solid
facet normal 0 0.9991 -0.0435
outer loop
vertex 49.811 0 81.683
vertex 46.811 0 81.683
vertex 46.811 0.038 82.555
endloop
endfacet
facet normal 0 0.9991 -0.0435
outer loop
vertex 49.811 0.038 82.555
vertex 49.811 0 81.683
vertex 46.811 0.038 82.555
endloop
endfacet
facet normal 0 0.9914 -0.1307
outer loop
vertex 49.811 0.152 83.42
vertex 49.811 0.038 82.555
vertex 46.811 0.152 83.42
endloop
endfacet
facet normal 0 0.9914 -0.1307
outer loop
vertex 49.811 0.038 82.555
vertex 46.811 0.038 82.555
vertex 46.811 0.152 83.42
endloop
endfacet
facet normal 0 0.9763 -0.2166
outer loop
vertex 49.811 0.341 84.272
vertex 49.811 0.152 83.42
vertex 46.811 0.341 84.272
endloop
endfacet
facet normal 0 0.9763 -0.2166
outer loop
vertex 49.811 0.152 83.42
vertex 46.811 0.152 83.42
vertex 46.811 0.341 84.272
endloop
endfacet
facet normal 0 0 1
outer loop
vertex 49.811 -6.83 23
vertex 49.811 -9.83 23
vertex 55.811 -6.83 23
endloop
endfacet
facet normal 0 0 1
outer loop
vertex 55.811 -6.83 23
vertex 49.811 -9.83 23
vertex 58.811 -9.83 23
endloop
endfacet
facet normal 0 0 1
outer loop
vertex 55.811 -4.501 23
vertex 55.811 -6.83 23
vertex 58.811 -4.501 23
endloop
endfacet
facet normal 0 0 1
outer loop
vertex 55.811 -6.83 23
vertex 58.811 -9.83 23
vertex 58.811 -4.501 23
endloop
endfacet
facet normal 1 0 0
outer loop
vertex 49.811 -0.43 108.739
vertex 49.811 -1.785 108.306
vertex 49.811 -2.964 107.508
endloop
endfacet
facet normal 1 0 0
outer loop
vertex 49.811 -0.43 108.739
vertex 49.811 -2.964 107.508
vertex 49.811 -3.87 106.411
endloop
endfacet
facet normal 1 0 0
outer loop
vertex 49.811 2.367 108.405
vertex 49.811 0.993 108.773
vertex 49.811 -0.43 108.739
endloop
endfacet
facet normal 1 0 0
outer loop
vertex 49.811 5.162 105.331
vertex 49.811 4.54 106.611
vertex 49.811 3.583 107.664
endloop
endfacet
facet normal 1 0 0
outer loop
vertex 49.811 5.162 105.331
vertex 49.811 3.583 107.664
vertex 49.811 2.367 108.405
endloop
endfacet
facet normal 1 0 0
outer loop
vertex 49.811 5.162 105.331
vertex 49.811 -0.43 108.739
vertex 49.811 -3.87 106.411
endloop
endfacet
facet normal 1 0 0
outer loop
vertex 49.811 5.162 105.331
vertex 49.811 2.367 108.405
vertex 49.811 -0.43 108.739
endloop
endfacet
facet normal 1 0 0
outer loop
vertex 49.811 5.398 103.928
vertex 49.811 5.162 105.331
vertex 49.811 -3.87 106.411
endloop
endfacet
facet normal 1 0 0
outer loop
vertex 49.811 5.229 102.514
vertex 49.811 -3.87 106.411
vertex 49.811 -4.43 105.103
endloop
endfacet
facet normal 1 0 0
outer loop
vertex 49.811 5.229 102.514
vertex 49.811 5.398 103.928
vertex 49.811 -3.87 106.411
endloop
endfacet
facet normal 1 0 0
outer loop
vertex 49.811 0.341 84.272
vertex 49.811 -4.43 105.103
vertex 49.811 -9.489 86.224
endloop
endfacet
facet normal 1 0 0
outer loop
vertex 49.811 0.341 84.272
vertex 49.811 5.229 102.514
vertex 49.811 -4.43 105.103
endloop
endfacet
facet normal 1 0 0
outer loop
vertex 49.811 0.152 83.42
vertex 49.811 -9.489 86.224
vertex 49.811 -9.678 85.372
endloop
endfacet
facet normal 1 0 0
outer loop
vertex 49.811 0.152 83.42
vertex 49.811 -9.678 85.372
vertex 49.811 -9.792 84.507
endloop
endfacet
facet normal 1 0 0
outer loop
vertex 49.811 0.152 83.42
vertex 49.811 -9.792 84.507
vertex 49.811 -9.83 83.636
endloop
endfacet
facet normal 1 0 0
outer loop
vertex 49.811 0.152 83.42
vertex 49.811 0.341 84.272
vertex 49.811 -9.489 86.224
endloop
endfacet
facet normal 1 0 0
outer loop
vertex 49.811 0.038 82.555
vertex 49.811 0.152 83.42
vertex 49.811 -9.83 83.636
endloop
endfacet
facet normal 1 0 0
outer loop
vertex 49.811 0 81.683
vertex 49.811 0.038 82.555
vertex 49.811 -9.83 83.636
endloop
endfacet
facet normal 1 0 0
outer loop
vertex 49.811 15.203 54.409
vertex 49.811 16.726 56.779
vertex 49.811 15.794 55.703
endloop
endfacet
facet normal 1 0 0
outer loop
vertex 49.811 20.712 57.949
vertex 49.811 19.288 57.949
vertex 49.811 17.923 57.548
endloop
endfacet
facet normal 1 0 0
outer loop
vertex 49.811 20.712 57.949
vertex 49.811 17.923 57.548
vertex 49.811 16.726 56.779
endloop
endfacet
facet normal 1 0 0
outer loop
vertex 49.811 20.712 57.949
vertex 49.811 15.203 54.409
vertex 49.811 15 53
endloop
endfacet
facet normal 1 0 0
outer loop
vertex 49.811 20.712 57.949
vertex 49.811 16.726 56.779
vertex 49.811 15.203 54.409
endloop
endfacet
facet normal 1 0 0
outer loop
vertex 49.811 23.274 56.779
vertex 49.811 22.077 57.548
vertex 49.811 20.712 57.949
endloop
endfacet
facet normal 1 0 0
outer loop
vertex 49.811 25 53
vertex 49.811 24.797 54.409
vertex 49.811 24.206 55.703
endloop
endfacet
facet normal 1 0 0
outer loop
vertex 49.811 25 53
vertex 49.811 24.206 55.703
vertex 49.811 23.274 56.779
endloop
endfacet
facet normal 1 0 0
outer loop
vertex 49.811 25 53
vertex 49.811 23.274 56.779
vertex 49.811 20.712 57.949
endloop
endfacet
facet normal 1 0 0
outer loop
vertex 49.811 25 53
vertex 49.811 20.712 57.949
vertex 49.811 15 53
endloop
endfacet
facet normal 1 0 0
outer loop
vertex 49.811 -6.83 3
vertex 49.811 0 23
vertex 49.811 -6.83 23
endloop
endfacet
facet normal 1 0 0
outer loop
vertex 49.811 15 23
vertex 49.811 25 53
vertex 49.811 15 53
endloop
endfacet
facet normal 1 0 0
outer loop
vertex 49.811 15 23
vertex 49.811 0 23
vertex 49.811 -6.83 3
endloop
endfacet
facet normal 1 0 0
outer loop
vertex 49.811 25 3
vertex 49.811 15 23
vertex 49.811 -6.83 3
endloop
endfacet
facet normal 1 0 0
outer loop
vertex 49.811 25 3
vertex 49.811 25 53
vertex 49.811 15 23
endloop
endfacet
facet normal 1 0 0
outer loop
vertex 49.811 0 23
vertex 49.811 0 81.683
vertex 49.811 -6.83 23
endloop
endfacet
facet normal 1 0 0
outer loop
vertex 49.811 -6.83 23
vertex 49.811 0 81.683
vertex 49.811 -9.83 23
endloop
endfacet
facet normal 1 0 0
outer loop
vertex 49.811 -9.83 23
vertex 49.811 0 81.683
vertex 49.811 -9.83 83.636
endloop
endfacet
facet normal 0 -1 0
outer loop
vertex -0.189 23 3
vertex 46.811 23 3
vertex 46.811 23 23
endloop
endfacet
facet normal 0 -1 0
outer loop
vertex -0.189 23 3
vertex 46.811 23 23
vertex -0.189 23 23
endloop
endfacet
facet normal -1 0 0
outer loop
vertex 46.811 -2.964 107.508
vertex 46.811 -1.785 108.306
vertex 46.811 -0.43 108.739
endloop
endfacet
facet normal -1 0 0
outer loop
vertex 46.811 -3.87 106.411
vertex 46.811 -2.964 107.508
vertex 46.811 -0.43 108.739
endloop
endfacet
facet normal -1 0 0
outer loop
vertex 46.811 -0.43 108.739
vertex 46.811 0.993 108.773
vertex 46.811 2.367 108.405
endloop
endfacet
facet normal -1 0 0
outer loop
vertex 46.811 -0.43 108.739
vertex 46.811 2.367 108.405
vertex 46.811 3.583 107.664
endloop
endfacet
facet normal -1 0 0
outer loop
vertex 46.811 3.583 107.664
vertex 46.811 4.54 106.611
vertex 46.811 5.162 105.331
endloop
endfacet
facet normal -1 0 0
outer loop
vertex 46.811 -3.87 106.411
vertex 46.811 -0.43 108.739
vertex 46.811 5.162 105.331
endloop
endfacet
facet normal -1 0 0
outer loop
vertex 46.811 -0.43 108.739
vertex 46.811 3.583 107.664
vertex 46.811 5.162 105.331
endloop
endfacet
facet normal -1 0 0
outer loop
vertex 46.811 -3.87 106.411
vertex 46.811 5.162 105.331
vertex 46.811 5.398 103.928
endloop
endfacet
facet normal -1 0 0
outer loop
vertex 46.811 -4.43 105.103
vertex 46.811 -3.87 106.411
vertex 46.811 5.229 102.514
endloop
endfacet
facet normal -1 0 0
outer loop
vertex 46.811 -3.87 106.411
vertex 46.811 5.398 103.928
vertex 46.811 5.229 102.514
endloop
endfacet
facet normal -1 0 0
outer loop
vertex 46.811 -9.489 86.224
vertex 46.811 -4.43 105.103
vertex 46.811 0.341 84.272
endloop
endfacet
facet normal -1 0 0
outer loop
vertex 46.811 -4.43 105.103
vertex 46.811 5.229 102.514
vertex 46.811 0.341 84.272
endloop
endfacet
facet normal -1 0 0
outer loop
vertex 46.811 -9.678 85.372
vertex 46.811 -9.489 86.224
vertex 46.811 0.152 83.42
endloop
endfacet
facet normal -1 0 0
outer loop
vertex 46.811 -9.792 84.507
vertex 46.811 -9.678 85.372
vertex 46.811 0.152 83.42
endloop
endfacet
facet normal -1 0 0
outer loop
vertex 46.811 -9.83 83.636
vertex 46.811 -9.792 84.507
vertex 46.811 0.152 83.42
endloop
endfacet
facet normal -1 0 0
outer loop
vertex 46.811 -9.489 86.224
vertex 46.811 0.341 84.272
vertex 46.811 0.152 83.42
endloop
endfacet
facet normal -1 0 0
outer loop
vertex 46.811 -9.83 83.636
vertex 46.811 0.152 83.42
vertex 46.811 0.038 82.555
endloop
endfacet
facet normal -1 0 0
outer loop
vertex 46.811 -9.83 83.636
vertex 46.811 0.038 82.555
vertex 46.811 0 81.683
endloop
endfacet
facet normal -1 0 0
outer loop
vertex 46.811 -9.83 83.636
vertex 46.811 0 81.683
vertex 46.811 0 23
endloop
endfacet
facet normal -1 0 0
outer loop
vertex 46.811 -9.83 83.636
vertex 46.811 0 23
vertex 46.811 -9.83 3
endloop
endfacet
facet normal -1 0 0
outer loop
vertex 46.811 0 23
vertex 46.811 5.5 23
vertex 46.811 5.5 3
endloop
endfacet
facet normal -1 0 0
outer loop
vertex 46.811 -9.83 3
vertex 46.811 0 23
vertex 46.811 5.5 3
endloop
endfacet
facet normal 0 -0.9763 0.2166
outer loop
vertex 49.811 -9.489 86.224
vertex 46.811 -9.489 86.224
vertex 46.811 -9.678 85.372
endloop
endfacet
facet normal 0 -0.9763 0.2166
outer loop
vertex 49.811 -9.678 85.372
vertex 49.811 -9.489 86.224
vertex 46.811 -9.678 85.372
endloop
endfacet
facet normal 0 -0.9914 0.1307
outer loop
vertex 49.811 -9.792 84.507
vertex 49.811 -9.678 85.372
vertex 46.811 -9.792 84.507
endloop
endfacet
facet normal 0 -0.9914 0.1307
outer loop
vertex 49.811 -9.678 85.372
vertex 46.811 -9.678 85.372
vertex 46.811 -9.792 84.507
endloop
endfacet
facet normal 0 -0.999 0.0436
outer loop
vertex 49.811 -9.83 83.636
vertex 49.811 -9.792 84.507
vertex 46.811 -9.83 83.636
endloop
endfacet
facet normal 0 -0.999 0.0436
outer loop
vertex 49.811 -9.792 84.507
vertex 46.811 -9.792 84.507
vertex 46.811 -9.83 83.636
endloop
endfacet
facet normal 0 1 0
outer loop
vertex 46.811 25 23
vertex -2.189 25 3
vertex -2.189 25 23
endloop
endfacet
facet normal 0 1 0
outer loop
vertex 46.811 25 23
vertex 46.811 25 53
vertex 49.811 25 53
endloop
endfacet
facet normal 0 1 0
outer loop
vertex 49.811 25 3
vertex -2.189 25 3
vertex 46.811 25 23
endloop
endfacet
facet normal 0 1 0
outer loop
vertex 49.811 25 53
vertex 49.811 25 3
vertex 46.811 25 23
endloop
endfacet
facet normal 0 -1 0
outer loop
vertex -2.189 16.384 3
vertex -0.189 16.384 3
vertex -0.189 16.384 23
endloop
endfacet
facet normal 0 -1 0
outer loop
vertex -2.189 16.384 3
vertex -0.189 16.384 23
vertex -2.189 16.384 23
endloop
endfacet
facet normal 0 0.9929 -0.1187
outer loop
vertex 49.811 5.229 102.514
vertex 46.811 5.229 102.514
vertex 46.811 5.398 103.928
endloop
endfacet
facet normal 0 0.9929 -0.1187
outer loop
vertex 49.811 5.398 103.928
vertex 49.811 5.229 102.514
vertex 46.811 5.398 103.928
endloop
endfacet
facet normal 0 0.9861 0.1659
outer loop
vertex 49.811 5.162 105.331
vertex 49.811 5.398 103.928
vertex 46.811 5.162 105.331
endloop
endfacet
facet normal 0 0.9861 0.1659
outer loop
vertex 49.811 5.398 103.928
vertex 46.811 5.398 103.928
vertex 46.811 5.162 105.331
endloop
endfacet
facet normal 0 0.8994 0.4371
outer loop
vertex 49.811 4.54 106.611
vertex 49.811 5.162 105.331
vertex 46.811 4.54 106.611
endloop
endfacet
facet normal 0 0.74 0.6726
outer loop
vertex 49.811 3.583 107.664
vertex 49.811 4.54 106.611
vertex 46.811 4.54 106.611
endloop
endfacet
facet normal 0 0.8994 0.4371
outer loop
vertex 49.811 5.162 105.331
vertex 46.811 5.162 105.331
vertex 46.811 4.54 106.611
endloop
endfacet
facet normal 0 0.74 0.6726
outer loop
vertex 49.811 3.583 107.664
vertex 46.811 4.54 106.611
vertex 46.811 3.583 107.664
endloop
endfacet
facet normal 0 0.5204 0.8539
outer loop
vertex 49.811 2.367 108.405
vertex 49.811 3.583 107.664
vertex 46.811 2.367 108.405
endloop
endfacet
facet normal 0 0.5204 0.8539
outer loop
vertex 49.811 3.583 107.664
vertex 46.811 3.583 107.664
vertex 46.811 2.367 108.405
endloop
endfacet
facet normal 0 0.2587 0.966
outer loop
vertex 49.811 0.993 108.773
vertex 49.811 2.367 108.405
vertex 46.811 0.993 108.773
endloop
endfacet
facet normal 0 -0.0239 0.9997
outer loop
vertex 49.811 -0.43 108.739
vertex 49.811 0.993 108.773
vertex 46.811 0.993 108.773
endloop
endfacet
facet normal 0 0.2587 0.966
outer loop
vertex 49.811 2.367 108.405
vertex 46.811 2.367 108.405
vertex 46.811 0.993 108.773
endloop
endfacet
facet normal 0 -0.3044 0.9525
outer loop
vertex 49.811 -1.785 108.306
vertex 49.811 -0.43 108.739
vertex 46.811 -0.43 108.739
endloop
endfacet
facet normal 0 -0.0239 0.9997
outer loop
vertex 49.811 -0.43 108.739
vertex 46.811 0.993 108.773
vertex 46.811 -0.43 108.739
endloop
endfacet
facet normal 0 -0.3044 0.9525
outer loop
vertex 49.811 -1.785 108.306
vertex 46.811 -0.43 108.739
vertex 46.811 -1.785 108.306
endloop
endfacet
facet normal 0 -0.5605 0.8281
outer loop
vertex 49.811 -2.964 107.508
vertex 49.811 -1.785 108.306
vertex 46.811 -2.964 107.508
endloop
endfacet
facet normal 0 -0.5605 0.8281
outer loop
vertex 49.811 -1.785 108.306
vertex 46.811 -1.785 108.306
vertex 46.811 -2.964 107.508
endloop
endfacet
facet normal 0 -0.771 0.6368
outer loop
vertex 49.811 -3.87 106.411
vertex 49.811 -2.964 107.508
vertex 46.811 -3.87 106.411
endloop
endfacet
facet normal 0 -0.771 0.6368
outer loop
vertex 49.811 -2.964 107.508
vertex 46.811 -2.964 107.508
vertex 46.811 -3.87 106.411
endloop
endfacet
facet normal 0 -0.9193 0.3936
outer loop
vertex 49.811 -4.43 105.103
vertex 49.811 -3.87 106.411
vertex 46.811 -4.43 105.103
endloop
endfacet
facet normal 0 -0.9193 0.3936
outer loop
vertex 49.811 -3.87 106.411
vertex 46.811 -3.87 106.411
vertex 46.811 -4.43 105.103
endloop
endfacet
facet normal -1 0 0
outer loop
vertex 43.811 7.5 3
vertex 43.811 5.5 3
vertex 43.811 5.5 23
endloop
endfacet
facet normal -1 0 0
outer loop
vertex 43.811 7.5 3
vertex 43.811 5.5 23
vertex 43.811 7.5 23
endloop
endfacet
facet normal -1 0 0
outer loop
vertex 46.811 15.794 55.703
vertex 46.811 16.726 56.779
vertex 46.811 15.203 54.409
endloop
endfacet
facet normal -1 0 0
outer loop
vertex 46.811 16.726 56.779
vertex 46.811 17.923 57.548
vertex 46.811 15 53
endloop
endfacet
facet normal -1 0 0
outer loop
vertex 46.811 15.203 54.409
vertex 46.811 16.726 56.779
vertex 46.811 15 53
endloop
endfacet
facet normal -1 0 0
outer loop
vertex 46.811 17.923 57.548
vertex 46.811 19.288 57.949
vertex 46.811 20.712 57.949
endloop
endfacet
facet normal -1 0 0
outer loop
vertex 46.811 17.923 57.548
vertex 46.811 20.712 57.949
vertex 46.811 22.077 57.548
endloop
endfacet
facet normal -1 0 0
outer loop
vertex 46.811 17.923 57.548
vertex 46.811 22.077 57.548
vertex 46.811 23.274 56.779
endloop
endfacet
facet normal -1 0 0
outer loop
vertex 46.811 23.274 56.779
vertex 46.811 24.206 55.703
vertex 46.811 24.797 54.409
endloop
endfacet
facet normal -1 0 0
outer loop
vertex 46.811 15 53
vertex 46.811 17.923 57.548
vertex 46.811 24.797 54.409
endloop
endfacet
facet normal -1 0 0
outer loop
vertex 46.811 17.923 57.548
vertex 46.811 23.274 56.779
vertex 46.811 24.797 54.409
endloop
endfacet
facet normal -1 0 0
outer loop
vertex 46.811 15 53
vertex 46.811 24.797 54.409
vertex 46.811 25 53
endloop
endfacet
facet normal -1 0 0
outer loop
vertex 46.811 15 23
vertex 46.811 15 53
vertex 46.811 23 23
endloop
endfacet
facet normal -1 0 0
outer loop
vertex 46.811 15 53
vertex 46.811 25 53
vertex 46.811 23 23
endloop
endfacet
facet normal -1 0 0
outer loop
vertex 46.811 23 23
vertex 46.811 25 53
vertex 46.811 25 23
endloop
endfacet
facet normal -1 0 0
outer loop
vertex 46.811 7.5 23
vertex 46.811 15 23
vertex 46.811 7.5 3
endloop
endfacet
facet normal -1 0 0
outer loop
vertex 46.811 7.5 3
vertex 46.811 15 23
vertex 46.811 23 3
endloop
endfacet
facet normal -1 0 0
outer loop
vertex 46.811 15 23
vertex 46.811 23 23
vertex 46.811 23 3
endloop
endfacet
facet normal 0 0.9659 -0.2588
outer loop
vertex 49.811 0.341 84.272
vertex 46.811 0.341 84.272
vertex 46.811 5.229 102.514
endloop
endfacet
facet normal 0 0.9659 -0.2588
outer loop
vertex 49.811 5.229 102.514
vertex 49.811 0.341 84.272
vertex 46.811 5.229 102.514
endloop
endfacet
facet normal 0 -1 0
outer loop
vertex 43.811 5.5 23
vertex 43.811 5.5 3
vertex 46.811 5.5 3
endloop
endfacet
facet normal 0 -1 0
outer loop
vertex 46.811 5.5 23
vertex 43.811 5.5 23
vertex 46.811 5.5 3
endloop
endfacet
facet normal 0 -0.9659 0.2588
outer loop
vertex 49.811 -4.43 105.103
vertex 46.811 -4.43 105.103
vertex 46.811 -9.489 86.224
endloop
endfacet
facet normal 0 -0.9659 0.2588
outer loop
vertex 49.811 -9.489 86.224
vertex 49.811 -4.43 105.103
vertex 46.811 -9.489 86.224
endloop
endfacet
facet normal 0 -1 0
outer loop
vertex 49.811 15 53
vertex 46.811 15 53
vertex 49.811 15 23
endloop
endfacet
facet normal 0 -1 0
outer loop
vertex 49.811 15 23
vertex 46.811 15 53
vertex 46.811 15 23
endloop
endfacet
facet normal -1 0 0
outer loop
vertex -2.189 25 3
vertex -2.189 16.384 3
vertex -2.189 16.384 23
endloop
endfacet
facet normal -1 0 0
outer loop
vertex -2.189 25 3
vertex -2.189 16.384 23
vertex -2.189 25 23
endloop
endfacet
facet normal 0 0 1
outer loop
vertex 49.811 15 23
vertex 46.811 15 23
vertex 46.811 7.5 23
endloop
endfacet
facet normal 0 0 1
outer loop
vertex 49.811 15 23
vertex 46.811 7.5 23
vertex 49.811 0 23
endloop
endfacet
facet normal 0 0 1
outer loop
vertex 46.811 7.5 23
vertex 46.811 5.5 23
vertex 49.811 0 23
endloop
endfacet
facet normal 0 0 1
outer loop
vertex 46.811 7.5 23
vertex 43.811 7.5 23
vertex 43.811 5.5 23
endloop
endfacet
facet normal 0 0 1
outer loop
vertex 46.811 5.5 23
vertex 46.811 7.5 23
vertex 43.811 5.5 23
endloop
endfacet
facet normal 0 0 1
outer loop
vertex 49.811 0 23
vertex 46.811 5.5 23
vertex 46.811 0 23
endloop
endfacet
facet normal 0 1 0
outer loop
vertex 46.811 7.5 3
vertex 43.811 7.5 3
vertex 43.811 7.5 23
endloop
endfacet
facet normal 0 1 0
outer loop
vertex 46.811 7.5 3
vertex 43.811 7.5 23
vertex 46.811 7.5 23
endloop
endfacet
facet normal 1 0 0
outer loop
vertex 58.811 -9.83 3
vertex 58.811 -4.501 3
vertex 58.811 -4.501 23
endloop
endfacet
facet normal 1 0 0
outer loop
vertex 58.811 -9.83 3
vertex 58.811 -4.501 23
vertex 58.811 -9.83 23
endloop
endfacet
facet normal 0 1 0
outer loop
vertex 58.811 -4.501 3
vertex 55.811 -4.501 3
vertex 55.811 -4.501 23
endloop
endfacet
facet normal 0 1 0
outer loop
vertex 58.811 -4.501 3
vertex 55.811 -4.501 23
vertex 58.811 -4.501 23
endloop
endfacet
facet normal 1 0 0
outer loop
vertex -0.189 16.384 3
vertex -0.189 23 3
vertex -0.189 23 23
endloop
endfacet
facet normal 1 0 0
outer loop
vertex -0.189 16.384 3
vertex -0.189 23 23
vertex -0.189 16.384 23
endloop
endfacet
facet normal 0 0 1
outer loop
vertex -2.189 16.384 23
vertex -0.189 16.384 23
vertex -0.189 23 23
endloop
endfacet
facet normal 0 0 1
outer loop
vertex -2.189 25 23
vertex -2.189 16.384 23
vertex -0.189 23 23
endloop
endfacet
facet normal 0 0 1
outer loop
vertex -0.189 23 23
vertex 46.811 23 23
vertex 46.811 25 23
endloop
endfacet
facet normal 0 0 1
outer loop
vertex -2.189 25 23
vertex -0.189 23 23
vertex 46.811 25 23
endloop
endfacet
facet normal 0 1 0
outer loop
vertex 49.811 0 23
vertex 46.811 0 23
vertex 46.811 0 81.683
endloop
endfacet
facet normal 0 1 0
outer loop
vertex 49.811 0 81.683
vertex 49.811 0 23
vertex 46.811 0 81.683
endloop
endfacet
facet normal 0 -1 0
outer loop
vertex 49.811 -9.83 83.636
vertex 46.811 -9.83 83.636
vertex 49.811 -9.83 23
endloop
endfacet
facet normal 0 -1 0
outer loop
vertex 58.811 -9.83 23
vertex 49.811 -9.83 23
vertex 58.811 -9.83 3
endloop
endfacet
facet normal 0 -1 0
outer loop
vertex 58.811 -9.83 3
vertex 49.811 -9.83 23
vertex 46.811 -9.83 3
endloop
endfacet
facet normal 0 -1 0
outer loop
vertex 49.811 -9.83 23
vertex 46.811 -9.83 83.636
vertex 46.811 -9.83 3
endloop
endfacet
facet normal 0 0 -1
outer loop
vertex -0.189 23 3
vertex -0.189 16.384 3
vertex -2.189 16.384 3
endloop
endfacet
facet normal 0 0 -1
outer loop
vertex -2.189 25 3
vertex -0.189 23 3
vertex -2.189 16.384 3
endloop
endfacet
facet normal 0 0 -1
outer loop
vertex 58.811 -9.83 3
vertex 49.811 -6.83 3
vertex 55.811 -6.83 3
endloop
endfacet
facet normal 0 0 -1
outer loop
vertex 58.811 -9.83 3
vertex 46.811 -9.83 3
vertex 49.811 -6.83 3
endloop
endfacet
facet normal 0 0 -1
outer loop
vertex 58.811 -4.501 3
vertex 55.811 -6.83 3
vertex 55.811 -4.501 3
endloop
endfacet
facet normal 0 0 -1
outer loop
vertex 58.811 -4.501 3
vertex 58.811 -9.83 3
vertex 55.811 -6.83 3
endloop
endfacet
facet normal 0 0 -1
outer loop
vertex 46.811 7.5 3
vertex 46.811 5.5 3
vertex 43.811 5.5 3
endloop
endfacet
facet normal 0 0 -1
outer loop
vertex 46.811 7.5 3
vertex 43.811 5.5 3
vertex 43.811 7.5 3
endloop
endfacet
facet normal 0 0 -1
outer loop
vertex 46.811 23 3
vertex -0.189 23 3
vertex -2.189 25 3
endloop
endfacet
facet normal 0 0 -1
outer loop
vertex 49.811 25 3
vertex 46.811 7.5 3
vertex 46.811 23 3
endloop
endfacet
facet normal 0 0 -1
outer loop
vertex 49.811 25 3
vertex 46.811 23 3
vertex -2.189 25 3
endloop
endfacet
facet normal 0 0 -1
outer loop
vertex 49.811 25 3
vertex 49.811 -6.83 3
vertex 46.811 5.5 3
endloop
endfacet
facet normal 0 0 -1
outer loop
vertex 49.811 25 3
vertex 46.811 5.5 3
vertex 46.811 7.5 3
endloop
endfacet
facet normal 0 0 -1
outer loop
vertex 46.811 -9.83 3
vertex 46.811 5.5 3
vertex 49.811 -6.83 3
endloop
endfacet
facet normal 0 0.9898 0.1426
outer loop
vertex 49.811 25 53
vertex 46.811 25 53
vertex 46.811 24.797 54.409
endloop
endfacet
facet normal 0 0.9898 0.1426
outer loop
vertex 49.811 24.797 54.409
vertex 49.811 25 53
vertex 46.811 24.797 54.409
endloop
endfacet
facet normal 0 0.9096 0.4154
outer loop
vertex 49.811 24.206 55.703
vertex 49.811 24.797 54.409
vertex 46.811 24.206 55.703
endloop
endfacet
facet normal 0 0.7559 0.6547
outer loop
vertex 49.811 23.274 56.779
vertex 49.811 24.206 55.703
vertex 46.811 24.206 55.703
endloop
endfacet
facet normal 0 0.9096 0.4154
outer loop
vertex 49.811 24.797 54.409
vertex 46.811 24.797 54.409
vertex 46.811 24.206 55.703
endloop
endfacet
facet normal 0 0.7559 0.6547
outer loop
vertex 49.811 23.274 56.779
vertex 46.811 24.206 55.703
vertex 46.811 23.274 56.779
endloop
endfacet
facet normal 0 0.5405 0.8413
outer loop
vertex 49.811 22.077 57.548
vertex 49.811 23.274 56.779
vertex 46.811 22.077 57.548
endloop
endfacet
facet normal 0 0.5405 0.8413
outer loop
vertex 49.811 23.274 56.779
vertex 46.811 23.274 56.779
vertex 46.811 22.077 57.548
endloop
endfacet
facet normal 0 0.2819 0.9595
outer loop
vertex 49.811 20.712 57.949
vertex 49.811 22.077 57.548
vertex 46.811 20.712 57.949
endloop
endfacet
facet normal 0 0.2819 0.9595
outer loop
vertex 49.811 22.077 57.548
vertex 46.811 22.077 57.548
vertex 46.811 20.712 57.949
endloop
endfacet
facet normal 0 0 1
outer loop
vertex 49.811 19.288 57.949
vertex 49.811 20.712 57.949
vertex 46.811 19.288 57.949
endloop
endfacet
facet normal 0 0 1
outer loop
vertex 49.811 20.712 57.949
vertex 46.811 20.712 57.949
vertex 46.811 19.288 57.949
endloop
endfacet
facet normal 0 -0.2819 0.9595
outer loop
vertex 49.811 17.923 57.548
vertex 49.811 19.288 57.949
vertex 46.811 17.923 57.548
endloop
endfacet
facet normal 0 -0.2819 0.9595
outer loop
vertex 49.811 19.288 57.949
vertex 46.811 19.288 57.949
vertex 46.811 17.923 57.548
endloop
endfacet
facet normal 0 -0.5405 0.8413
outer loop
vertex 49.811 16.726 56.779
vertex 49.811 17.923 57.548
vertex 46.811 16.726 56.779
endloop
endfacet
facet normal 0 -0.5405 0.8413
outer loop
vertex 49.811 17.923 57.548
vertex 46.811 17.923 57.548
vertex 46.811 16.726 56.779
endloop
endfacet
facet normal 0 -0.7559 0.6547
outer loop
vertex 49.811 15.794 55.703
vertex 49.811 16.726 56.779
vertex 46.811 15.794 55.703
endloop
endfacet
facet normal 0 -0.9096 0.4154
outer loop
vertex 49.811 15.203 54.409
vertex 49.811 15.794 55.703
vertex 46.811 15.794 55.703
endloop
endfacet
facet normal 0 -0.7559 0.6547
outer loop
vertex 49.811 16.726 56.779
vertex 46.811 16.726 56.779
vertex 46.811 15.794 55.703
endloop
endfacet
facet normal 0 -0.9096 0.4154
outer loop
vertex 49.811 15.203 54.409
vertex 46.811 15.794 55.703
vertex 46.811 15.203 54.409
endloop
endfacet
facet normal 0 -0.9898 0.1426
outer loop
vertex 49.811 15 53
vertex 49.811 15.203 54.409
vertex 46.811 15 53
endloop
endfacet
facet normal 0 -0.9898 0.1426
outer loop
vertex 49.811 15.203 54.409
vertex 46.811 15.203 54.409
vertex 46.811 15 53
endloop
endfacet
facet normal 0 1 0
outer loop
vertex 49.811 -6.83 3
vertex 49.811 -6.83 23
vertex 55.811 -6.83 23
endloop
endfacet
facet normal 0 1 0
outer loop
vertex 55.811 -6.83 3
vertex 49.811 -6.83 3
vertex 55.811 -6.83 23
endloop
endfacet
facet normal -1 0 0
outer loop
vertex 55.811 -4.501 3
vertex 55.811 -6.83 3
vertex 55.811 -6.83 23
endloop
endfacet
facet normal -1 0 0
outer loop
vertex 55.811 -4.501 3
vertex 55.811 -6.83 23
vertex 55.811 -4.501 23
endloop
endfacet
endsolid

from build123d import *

# Parameters (mm, degrees)
F1_DEPTH = 3
F2_W     = 2
F2_H     = 3
F3_DEPTH = 20
F4_ANGLE = -90


with BuildPart() as f1:
    # F0 (on Top) → F1 (new body)
    with BuildSketch(Plane.XY):
        with BuildLine():
            Line((29.811265, 0), (-28.87221, 0))
            ThreePointArc((-28.87221, 0), (-30.177472, 0.085551), (-31.460401, 0.340742))
            Line((-31.460401, 0.340742), (-49.703157, 5.228874))
            ThreePointArc((-49.703157, 5.228874), (-55.826882, 1.69334), (-52.291348, -4.430385))
            Line((-52.291348, -4.430385), (-33.412757, -9.488888))
            ThreePointArc((-33.412757, -9.488888), (-32.129829, -9.744078), (-30.824567, -9.82963))
            Line((-30.824567, -9.82963), (49.811265, -9.82963))
            Line((49.811265, -9.82963), (49.811265, 25))
            Line((49.811265, 25), (-0.188735, 25))
            ThreePointArc((-0.188735, 25), (-5.188735, 20), (-0.188735, 15))
            Line((-0.188735, 15), (29.811265, 15))
            Line((29.811265, 15), (29.811265, 0))
        make_face()
    extrude(amount=F1_DEPTH)

    # F2 (on face) → F3 (join, through all)
    with BuildSketch(Plane.YZ.offset(49.811265)):
        Polygon((25, -49), (25, 0), (23, 0), (23, -47), (16.384248, -47), (16.384248, -49), align=None)
        with Locations((6.5, -1.5)):
            Rectangle(F2_W, F2_H)
        Polygon((-9.82963, 3), (-6.82963, 3), (-6.82963, 9), (-4.501271, 9), (-4.501271, 12), (-9.82963, 12), align=None)
    extrude(amount=-F3_DEPTH)


with BuildPart() as f1_1:
    # F4: moved
    add(f1.part.rotate(Axis((49.811265, 9.085185, 3), (0, -1, 0)), F4_ANGLE))


solid = f1_1.part
